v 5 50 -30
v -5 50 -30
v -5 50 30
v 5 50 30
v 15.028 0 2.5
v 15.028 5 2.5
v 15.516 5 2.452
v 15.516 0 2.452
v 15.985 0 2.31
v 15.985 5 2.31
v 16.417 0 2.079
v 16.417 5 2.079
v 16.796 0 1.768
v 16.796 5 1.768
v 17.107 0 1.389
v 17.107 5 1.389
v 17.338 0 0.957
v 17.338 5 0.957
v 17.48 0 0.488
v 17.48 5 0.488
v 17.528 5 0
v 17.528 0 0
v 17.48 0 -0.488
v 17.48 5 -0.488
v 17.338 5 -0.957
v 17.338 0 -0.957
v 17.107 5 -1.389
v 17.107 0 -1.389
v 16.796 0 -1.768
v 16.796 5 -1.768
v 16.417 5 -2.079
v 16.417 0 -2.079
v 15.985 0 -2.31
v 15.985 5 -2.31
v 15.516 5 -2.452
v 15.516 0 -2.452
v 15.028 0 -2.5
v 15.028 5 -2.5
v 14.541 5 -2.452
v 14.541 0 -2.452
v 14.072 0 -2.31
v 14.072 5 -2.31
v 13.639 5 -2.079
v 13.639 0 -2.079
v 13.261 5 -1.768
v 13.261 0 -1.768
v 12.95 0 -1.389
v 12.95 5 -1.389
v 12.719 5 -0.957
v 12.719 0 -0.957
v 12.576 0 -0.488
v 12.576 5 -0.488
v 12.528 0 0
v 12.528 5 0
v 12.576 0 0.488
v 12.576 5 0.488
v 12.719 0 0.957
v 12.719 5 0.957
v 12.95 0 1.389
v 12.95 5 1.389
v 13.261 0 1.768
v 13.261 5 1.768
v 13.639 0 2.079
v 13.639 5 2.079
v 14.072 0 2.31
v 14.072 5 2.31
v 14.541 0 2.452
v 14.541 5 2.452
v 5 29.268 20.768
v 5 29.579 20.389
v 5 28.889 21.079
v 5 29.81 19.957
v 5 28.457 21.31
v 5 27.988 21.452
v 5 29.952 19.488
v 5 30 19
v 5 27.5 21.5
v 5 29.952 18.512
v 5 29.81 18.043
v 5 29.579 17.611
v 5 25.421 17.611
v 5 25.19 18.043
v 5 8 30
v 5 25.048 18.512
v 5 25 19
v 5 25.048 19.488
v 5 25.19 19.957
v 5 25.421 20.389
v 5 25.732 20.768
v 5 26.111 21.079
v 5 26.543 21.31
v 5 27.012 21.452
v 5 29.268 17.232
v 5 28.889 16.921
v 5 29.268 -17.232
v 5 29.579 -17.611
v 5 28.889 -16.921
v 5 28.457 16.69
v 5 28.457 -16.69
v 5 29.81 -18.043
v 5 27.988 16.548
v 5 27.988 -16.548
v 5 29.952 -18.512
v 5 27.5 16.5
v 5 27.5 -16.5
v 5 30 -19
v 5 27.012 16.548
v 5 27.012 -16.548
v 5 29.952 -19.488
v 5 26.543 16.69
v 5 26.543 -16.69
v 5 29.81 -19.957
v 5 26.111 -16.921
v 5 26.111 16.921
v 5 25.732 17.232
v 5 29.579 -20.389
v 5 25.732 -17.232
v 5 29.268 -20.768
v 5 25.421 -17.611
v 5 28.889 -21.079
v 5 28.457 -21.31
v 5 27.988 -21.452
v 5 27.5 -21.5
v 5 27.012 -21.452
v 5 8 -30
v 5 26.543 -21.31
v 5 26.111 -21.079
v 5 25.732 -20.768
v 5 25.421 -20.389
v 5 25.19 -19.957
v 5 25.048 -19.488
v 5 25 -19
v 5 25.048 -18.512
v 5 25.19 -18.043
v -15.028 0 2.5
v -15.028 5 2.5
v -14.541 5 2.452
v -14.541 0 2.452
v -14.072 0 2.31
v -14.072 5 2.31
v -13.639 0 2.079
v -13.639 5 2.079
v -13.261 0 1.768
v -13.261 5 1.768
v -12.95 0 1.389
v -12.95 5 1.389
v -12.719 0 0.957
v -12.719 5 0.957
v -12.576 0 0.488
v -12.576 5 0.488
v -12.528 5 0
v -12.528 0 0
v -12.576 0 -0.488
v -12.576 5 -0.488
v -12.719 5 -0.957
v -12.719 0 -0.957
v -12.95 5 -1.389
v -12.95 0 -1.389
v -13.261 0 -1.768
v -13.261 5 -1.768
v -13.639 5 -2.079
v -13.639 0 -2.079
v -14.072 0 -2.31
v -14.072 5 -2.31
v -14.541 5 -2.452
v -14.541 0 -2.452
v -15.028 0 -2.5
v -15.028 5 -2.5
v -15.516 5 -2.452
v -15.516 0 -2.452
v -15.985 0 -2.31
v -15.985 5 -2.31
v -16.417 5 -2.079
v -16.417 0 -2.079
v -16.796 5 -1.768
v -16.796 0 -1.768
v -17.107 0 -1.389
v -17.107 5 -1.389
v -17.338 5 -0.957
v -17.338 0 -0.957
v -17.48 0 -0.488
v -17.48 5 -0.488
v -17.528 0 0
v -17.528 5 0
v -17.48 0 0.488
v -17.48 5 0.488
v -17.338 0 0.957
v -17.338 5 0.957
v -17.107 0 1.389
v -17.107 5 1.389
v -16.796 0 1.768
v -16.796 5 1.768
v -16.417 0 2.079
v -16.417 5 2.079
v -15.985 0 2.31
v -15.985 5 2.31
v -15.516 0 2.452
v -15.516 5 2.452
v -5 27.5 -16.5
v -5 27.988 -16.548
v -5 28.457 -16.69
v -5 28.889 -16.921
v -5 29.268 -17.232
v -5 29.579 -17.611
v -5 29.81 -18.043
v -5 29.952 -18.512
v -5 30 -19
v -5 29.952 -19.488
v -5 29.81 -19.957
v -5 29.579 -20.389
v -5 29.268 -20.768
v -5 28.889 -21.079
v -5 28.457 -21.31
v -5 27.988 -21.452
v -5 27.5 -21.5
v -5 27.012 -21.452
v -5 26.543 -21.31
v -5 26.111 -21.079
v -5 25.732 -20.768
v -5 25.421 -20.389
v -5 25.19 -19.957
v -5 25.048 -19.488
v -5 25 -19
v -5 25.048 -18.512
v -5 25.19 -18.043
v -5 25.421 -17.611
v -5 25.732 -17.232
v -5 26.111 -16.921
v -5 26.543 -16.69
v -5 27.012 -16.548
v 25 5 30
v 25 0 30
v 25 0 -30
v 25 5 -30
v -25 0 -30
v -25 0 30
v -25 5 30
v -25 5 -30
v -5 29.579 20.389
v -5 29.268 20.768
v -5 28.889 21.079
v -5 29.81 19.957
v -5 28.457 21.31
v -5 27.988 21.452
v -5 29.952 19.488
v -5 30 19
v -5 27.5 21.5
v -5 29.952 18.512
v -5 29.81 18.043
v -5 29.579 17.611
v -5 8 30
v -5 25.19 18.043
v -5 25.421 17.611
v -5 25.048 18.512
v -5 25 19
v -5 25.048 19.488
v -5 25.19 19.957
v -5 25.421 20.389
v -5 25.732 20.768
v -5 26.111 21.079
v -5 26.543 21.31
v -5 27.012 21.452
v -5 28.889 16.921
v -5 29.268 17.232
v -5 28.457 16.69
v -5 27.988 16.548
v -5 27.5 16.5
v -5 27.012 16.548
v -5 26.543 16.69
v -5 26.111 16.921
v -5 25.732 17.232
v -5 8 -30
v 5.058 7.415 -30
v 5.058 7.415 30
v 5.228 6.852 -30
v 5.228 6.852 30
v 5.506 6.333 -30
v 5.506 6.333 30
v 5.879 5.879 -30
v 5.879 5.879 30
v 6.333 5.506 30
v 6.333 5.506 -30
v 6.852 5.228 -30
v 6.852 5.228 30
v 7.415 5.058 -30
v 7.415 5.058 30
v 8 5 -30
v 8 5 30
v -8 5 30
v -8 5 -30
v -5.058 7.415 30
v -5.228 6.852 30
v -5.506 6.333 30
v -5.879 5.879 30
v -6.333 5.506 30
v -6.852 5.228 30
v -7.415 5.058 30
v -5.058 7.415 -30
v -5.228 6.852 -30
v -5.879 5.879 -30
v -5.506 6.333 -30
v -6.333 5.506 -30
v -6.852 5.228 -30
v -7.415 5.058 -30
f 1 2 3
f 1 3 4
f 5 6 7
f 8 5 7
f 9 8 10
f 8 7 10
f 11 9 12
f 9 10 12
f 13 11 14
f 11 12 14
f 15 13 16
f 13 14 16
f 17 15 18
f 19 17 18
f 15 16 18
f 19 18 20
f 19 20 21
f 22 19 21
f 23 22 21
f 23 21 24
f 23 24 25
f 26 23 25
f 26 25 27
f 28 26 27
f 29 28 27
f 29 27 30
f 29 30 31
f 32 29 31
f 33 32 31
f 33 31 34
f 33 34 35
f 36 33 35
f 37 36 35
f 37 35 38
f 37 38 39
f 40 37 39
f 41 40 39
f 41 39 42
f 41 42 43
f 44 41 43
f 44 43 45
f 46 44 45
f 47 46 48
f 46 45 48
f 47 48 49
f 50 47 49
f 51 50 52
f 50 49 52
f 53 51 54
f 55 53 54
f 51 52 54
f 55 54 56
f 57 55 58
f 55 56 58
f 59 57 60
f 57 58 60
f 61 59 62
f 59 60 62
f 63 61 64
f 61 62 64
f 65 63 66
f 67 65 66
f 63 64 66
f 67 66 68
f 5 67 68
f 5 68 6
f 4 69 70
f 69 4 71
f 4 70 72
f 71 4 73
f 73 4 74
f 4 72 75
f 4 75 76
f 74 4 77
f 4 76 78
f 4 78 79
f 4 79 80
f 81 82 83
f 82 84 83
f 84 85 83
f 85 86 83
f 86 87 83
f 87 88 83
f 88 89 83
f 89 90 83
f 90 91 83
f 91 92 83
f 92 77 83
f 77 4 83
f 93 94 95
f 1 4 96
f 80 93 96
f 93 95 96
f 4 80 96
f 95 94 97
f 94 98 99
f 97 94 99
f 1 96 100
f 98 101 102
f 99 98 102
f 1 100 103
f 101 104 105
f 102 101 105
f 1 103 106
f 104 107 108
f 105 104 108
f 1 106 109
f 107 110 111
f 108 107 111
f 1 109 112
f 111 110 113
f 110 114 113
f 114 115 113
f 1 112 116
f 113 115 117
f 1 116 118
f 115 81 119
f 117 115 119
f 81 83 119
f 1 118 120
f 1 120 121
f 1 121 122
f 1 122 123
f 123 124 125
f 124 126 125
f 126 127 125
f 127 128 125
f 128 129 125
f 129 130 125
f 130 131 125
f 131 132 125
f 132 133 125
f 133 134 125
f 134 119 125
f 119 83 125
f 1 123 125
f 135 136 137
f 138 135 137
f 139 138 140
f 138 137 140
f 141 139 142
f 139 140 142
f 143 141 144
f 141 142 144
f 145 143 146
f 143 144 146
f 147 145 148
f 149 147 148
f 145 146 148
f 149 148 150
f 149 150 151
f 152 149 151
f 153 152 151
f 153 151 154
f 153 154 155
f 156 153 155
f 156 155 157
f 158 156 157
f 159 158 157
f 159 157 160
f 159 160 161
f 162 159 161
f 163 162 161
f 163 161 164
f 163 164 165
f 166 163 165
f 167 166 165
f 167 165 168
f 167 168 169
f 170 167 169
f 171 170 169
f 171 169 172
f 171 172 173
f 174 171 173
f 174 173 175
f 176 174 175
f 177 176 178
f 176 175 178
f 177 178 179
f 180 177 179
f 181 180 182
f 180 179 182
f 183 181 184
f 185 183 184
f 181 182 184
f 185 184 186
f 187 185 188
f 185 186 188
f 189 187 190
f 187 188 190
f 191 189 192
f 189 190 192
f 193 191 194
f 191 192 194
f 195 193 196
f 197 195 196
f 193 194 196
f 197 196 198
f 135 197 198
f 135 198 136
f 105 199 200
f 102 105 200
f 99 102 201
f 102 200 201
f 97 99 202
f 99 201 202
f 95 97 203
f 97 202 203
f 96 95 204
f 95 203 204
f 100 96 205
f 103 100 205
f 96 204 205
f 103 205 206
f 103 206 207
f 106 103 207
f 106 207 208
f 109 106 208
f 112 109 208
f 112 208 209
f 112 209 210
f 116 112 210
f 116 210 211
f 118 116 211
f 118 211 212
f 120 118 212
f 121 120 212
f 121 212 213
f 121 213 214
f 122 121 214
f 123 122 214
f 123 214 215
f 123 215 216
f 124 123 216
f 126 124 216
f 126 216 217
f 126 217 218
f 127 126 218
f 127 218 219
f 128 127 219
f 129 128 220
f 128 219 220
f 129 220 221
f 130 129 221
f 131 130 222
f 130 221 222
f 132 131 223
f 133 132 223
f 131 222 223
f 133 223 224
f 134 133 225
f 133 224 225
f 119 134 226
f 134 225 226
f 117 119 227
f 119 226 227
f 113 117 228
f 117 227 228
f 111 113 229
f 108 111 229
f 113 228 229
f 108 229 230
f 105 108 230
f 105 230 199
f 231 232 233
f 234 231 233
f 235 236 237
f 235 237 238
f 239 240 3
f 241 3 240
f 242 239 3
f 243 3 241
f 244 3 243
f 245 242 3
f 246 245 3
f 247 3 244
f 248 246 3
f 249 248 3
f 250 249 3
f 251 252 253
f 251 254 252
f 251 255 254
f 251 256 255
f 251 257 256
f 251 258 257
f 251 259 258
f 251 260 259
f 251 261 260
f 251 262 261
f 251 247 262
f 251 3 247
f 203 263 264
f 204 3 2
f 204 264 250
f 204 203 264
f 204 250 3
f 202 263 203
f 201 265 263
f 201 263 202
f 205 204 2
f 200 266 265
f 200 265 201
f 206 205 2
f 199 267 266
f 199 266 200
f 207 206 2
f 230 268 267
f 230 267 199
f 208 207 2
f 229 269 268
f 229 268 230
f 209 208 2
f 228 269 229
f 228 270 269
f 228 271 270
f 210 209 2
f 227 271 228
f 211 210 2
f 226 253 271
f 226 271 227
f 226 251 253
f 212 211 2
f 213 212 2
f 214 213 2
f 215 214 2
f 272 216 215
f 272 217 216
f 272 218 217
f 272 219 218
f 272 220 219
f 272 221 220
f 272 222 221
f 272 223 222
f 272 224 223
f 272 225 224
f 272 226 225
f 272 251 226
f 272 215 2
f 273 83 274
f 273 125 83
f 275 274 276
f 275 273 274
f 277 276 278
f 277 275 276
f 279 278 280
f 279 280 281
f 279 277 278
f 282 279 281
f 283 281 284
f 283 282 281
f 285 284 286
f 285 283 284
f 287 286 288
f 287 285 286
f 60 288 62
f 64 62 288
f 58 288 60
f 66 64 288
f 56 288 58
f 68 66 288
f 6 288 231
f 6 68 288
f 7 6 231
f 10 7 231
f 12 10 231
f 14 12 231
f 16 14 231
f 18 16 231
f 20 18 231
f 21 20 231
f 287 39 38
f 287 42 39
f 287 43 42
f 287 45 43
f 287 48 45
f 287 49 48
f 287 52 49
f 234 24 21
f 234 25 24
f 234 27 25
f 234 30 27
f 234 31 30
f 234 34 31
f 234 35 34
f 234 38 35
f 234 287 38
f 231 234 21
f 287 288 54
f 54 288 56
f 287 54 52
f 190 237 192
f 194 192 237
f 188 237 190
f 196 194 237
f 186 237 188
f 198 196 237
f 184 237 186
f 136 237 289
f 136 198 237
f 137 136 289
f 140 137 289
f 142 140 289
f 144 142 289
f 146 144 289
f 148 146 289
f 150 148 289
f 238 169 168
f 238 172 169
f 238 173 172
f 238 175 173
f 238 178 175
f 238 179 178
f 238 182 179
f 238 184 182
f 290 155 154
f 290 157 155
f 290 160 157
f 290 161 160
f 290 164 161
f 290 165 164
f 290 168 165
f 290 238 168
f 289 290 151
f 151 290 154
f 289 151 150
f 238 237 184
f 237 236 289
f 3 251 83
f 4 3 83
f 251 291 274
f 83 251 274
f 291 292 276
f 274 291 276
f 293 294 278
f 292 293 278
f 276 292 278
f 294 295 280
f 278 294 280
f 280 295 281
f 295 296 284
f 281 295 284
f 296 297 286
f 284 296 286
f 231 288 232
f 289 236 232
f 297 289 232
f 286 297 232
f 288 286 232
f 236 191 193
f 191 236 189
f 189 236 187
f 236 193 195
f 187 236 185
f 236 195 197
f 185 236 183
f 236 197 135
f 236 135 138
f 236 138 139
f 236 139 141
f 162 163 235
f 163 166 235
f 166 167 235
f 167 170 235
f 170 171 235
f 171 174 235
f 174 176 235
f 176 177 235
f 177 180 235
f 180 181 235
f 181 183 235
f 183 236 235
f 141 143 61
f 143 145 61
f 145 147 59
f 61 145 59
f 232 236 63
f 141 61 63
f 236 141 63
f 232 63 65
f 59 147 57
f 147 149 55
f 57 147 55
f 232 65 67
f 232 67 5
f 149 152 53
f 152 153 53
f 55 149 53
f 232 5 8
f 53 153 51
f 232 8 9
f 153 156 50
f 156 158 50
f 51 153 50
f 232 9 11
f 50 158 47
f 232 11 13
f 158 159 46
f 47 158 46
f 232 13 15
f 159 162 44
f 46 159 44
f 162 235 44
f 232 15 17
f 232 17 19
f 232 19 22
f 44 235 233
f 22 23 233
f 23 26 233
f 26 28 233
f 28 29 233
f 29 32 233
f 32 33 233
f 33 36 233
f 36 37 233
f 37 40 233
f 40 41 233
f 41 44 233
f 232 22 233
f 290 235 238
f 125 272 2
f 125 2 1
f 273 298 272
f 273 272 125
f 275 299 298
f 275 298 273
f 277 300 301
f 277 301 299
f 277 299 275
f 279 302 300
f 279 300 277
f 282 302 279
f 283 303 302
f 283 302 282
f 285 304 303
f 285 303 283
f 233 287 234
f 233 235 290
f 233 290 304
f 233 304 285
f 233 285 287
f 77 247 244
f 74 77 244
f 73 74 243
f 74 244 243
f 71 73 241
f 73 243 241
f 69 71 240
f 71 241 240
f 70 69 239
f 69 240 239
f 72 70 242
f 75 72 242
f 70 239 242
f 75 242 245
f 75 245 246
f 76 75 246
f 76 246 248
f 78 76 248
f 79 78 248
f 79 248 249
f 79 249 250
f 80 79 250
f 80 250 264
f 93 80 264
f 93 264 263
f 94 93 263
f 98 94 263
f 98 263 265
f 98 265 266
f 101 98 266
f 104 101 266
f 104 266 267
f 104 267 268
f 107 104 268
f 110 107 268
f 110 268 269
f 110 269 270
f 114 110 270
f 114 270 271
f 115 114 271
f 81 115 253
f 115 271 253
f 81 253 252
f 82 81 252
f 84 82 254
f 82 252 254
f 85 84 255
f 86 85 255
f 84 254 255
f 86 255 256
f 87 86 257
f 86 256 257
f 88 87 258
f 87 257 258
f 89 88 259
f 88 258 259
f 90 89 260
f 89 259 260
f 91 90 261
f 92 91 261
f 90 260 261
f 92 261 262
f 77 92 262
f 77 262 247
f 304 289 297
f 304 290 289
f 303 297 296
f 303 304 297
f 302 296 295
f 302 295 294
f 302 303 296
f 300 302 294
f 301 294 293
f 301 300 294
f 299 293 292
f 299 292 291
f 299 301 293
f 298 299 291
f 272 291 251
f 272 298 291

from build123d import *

# Parameters (mm, degrees)
SKETCH1_W           = 50
SKETCH1_H           = 60
BOSS_EXTRUDE1_DEPTH = 5
SKETCH2_W           = 10
SKETCH2_H           = 60
BOSS_EXTRUDE2_DEPTH = 45
SKETCH3_R           = 2.5
CUT_EXTRUDE1_DEPTH  = 60.581876439
CUT_EXTRUDE2_REACH  = 67.574
SKETCH5_R           = 2.5
FILLET1_R           = 3


with BuildPart() as part:
    # Sketch1 → Boss-Extrude1 (new body)
    with BuildSketch(Plane(origin=(0, 0, 0), x_dir=(1, 0, 0), z_dir=(0, 1, 0))):
        Rectangle(SKETCH1_W, SKETCH1_H)
    extrude(amount=BOSS_EXTRUDE1_DEPTH)

    # Sketch2 → Boss-Extrude2 (add)
    with BuildSketch(Plane(origin=(0, 5, 0), x_dir=(1, 0, 0), z_dir=(0, 1, 0))):
        Rectangle(SKETCH2_W, SKETCH2_H)
    extrude(amount=BOSS_EXTRUDE2_DEPTH)

    # Sketch3 → Cut-Extrude1 (cut, through all)
    with BuildSketch(Plane(origin=(0, 5, 0), x_dir=(1, 0, 0), z_dir=(0, 1, 0))):
        with Locations(Location((-15.028328695, 0, 0), (0, 0, 270))):
            Circle(SKETCH3_R)
        with Locations(Location((15.028328695, 0, 0), (0, 0, 270))):
            Circle(SKETCH3_R)
    extrude(amount=-CUT_EXTRUDE1_DEPTH, mode=Mode.SUBTRACT)

    # Sketch5 → Cut-Extrude2 (cut, up to next)
    with BuildSketch(Plane.ZY.offset(5), mode=Mode.PRIVATE) as cut_extrude2_sk1:
        with Locations((-19, 27.5)):
            Circle(SKETCH5_R)
    cut_extrude2_tool1 = extrude(cut_extrude2_sk1.sketch, amount=-CUT_EXTRUDE2_REACH, mode=Mode.PRIVATE) & part.part
    # Sketch5 → Cut-Extrude2 (cut, up to next)
    with BuildSketch(Plane.ZY.offset(5), mode=Mode.PRIVATE) as cut_extrude2_sk2:
        with Locations((19, 27.5)):
            Circle(SKETCH5_R)
    cut_extrude2_tool2 = extrude(cut_extrude2_sk2.sketch, amount=-CUT_EXTRUDE2_REACH, mode=Mode.PRIVATE) & part.part
    add(cut_extrude2_tool1.solids().sort_by_distance((-5, 27.5, -19))[0], mode=Mode.SUBTRACT)
    add(cut_extrude2_tool2.solids().sort_by_distance((-5, 27.5, 19))[0], mode=Mode.SUBTRACT)

    # Fillet1
    fillet1_edges = [part.edges().sort_by_distance(p)[0] for p in [
        (5, 5, 0),
        (-5, 5, 0),
    ]]
    fillet(fillet1_edges, radius=FILLET1_R)


solid = part.part
